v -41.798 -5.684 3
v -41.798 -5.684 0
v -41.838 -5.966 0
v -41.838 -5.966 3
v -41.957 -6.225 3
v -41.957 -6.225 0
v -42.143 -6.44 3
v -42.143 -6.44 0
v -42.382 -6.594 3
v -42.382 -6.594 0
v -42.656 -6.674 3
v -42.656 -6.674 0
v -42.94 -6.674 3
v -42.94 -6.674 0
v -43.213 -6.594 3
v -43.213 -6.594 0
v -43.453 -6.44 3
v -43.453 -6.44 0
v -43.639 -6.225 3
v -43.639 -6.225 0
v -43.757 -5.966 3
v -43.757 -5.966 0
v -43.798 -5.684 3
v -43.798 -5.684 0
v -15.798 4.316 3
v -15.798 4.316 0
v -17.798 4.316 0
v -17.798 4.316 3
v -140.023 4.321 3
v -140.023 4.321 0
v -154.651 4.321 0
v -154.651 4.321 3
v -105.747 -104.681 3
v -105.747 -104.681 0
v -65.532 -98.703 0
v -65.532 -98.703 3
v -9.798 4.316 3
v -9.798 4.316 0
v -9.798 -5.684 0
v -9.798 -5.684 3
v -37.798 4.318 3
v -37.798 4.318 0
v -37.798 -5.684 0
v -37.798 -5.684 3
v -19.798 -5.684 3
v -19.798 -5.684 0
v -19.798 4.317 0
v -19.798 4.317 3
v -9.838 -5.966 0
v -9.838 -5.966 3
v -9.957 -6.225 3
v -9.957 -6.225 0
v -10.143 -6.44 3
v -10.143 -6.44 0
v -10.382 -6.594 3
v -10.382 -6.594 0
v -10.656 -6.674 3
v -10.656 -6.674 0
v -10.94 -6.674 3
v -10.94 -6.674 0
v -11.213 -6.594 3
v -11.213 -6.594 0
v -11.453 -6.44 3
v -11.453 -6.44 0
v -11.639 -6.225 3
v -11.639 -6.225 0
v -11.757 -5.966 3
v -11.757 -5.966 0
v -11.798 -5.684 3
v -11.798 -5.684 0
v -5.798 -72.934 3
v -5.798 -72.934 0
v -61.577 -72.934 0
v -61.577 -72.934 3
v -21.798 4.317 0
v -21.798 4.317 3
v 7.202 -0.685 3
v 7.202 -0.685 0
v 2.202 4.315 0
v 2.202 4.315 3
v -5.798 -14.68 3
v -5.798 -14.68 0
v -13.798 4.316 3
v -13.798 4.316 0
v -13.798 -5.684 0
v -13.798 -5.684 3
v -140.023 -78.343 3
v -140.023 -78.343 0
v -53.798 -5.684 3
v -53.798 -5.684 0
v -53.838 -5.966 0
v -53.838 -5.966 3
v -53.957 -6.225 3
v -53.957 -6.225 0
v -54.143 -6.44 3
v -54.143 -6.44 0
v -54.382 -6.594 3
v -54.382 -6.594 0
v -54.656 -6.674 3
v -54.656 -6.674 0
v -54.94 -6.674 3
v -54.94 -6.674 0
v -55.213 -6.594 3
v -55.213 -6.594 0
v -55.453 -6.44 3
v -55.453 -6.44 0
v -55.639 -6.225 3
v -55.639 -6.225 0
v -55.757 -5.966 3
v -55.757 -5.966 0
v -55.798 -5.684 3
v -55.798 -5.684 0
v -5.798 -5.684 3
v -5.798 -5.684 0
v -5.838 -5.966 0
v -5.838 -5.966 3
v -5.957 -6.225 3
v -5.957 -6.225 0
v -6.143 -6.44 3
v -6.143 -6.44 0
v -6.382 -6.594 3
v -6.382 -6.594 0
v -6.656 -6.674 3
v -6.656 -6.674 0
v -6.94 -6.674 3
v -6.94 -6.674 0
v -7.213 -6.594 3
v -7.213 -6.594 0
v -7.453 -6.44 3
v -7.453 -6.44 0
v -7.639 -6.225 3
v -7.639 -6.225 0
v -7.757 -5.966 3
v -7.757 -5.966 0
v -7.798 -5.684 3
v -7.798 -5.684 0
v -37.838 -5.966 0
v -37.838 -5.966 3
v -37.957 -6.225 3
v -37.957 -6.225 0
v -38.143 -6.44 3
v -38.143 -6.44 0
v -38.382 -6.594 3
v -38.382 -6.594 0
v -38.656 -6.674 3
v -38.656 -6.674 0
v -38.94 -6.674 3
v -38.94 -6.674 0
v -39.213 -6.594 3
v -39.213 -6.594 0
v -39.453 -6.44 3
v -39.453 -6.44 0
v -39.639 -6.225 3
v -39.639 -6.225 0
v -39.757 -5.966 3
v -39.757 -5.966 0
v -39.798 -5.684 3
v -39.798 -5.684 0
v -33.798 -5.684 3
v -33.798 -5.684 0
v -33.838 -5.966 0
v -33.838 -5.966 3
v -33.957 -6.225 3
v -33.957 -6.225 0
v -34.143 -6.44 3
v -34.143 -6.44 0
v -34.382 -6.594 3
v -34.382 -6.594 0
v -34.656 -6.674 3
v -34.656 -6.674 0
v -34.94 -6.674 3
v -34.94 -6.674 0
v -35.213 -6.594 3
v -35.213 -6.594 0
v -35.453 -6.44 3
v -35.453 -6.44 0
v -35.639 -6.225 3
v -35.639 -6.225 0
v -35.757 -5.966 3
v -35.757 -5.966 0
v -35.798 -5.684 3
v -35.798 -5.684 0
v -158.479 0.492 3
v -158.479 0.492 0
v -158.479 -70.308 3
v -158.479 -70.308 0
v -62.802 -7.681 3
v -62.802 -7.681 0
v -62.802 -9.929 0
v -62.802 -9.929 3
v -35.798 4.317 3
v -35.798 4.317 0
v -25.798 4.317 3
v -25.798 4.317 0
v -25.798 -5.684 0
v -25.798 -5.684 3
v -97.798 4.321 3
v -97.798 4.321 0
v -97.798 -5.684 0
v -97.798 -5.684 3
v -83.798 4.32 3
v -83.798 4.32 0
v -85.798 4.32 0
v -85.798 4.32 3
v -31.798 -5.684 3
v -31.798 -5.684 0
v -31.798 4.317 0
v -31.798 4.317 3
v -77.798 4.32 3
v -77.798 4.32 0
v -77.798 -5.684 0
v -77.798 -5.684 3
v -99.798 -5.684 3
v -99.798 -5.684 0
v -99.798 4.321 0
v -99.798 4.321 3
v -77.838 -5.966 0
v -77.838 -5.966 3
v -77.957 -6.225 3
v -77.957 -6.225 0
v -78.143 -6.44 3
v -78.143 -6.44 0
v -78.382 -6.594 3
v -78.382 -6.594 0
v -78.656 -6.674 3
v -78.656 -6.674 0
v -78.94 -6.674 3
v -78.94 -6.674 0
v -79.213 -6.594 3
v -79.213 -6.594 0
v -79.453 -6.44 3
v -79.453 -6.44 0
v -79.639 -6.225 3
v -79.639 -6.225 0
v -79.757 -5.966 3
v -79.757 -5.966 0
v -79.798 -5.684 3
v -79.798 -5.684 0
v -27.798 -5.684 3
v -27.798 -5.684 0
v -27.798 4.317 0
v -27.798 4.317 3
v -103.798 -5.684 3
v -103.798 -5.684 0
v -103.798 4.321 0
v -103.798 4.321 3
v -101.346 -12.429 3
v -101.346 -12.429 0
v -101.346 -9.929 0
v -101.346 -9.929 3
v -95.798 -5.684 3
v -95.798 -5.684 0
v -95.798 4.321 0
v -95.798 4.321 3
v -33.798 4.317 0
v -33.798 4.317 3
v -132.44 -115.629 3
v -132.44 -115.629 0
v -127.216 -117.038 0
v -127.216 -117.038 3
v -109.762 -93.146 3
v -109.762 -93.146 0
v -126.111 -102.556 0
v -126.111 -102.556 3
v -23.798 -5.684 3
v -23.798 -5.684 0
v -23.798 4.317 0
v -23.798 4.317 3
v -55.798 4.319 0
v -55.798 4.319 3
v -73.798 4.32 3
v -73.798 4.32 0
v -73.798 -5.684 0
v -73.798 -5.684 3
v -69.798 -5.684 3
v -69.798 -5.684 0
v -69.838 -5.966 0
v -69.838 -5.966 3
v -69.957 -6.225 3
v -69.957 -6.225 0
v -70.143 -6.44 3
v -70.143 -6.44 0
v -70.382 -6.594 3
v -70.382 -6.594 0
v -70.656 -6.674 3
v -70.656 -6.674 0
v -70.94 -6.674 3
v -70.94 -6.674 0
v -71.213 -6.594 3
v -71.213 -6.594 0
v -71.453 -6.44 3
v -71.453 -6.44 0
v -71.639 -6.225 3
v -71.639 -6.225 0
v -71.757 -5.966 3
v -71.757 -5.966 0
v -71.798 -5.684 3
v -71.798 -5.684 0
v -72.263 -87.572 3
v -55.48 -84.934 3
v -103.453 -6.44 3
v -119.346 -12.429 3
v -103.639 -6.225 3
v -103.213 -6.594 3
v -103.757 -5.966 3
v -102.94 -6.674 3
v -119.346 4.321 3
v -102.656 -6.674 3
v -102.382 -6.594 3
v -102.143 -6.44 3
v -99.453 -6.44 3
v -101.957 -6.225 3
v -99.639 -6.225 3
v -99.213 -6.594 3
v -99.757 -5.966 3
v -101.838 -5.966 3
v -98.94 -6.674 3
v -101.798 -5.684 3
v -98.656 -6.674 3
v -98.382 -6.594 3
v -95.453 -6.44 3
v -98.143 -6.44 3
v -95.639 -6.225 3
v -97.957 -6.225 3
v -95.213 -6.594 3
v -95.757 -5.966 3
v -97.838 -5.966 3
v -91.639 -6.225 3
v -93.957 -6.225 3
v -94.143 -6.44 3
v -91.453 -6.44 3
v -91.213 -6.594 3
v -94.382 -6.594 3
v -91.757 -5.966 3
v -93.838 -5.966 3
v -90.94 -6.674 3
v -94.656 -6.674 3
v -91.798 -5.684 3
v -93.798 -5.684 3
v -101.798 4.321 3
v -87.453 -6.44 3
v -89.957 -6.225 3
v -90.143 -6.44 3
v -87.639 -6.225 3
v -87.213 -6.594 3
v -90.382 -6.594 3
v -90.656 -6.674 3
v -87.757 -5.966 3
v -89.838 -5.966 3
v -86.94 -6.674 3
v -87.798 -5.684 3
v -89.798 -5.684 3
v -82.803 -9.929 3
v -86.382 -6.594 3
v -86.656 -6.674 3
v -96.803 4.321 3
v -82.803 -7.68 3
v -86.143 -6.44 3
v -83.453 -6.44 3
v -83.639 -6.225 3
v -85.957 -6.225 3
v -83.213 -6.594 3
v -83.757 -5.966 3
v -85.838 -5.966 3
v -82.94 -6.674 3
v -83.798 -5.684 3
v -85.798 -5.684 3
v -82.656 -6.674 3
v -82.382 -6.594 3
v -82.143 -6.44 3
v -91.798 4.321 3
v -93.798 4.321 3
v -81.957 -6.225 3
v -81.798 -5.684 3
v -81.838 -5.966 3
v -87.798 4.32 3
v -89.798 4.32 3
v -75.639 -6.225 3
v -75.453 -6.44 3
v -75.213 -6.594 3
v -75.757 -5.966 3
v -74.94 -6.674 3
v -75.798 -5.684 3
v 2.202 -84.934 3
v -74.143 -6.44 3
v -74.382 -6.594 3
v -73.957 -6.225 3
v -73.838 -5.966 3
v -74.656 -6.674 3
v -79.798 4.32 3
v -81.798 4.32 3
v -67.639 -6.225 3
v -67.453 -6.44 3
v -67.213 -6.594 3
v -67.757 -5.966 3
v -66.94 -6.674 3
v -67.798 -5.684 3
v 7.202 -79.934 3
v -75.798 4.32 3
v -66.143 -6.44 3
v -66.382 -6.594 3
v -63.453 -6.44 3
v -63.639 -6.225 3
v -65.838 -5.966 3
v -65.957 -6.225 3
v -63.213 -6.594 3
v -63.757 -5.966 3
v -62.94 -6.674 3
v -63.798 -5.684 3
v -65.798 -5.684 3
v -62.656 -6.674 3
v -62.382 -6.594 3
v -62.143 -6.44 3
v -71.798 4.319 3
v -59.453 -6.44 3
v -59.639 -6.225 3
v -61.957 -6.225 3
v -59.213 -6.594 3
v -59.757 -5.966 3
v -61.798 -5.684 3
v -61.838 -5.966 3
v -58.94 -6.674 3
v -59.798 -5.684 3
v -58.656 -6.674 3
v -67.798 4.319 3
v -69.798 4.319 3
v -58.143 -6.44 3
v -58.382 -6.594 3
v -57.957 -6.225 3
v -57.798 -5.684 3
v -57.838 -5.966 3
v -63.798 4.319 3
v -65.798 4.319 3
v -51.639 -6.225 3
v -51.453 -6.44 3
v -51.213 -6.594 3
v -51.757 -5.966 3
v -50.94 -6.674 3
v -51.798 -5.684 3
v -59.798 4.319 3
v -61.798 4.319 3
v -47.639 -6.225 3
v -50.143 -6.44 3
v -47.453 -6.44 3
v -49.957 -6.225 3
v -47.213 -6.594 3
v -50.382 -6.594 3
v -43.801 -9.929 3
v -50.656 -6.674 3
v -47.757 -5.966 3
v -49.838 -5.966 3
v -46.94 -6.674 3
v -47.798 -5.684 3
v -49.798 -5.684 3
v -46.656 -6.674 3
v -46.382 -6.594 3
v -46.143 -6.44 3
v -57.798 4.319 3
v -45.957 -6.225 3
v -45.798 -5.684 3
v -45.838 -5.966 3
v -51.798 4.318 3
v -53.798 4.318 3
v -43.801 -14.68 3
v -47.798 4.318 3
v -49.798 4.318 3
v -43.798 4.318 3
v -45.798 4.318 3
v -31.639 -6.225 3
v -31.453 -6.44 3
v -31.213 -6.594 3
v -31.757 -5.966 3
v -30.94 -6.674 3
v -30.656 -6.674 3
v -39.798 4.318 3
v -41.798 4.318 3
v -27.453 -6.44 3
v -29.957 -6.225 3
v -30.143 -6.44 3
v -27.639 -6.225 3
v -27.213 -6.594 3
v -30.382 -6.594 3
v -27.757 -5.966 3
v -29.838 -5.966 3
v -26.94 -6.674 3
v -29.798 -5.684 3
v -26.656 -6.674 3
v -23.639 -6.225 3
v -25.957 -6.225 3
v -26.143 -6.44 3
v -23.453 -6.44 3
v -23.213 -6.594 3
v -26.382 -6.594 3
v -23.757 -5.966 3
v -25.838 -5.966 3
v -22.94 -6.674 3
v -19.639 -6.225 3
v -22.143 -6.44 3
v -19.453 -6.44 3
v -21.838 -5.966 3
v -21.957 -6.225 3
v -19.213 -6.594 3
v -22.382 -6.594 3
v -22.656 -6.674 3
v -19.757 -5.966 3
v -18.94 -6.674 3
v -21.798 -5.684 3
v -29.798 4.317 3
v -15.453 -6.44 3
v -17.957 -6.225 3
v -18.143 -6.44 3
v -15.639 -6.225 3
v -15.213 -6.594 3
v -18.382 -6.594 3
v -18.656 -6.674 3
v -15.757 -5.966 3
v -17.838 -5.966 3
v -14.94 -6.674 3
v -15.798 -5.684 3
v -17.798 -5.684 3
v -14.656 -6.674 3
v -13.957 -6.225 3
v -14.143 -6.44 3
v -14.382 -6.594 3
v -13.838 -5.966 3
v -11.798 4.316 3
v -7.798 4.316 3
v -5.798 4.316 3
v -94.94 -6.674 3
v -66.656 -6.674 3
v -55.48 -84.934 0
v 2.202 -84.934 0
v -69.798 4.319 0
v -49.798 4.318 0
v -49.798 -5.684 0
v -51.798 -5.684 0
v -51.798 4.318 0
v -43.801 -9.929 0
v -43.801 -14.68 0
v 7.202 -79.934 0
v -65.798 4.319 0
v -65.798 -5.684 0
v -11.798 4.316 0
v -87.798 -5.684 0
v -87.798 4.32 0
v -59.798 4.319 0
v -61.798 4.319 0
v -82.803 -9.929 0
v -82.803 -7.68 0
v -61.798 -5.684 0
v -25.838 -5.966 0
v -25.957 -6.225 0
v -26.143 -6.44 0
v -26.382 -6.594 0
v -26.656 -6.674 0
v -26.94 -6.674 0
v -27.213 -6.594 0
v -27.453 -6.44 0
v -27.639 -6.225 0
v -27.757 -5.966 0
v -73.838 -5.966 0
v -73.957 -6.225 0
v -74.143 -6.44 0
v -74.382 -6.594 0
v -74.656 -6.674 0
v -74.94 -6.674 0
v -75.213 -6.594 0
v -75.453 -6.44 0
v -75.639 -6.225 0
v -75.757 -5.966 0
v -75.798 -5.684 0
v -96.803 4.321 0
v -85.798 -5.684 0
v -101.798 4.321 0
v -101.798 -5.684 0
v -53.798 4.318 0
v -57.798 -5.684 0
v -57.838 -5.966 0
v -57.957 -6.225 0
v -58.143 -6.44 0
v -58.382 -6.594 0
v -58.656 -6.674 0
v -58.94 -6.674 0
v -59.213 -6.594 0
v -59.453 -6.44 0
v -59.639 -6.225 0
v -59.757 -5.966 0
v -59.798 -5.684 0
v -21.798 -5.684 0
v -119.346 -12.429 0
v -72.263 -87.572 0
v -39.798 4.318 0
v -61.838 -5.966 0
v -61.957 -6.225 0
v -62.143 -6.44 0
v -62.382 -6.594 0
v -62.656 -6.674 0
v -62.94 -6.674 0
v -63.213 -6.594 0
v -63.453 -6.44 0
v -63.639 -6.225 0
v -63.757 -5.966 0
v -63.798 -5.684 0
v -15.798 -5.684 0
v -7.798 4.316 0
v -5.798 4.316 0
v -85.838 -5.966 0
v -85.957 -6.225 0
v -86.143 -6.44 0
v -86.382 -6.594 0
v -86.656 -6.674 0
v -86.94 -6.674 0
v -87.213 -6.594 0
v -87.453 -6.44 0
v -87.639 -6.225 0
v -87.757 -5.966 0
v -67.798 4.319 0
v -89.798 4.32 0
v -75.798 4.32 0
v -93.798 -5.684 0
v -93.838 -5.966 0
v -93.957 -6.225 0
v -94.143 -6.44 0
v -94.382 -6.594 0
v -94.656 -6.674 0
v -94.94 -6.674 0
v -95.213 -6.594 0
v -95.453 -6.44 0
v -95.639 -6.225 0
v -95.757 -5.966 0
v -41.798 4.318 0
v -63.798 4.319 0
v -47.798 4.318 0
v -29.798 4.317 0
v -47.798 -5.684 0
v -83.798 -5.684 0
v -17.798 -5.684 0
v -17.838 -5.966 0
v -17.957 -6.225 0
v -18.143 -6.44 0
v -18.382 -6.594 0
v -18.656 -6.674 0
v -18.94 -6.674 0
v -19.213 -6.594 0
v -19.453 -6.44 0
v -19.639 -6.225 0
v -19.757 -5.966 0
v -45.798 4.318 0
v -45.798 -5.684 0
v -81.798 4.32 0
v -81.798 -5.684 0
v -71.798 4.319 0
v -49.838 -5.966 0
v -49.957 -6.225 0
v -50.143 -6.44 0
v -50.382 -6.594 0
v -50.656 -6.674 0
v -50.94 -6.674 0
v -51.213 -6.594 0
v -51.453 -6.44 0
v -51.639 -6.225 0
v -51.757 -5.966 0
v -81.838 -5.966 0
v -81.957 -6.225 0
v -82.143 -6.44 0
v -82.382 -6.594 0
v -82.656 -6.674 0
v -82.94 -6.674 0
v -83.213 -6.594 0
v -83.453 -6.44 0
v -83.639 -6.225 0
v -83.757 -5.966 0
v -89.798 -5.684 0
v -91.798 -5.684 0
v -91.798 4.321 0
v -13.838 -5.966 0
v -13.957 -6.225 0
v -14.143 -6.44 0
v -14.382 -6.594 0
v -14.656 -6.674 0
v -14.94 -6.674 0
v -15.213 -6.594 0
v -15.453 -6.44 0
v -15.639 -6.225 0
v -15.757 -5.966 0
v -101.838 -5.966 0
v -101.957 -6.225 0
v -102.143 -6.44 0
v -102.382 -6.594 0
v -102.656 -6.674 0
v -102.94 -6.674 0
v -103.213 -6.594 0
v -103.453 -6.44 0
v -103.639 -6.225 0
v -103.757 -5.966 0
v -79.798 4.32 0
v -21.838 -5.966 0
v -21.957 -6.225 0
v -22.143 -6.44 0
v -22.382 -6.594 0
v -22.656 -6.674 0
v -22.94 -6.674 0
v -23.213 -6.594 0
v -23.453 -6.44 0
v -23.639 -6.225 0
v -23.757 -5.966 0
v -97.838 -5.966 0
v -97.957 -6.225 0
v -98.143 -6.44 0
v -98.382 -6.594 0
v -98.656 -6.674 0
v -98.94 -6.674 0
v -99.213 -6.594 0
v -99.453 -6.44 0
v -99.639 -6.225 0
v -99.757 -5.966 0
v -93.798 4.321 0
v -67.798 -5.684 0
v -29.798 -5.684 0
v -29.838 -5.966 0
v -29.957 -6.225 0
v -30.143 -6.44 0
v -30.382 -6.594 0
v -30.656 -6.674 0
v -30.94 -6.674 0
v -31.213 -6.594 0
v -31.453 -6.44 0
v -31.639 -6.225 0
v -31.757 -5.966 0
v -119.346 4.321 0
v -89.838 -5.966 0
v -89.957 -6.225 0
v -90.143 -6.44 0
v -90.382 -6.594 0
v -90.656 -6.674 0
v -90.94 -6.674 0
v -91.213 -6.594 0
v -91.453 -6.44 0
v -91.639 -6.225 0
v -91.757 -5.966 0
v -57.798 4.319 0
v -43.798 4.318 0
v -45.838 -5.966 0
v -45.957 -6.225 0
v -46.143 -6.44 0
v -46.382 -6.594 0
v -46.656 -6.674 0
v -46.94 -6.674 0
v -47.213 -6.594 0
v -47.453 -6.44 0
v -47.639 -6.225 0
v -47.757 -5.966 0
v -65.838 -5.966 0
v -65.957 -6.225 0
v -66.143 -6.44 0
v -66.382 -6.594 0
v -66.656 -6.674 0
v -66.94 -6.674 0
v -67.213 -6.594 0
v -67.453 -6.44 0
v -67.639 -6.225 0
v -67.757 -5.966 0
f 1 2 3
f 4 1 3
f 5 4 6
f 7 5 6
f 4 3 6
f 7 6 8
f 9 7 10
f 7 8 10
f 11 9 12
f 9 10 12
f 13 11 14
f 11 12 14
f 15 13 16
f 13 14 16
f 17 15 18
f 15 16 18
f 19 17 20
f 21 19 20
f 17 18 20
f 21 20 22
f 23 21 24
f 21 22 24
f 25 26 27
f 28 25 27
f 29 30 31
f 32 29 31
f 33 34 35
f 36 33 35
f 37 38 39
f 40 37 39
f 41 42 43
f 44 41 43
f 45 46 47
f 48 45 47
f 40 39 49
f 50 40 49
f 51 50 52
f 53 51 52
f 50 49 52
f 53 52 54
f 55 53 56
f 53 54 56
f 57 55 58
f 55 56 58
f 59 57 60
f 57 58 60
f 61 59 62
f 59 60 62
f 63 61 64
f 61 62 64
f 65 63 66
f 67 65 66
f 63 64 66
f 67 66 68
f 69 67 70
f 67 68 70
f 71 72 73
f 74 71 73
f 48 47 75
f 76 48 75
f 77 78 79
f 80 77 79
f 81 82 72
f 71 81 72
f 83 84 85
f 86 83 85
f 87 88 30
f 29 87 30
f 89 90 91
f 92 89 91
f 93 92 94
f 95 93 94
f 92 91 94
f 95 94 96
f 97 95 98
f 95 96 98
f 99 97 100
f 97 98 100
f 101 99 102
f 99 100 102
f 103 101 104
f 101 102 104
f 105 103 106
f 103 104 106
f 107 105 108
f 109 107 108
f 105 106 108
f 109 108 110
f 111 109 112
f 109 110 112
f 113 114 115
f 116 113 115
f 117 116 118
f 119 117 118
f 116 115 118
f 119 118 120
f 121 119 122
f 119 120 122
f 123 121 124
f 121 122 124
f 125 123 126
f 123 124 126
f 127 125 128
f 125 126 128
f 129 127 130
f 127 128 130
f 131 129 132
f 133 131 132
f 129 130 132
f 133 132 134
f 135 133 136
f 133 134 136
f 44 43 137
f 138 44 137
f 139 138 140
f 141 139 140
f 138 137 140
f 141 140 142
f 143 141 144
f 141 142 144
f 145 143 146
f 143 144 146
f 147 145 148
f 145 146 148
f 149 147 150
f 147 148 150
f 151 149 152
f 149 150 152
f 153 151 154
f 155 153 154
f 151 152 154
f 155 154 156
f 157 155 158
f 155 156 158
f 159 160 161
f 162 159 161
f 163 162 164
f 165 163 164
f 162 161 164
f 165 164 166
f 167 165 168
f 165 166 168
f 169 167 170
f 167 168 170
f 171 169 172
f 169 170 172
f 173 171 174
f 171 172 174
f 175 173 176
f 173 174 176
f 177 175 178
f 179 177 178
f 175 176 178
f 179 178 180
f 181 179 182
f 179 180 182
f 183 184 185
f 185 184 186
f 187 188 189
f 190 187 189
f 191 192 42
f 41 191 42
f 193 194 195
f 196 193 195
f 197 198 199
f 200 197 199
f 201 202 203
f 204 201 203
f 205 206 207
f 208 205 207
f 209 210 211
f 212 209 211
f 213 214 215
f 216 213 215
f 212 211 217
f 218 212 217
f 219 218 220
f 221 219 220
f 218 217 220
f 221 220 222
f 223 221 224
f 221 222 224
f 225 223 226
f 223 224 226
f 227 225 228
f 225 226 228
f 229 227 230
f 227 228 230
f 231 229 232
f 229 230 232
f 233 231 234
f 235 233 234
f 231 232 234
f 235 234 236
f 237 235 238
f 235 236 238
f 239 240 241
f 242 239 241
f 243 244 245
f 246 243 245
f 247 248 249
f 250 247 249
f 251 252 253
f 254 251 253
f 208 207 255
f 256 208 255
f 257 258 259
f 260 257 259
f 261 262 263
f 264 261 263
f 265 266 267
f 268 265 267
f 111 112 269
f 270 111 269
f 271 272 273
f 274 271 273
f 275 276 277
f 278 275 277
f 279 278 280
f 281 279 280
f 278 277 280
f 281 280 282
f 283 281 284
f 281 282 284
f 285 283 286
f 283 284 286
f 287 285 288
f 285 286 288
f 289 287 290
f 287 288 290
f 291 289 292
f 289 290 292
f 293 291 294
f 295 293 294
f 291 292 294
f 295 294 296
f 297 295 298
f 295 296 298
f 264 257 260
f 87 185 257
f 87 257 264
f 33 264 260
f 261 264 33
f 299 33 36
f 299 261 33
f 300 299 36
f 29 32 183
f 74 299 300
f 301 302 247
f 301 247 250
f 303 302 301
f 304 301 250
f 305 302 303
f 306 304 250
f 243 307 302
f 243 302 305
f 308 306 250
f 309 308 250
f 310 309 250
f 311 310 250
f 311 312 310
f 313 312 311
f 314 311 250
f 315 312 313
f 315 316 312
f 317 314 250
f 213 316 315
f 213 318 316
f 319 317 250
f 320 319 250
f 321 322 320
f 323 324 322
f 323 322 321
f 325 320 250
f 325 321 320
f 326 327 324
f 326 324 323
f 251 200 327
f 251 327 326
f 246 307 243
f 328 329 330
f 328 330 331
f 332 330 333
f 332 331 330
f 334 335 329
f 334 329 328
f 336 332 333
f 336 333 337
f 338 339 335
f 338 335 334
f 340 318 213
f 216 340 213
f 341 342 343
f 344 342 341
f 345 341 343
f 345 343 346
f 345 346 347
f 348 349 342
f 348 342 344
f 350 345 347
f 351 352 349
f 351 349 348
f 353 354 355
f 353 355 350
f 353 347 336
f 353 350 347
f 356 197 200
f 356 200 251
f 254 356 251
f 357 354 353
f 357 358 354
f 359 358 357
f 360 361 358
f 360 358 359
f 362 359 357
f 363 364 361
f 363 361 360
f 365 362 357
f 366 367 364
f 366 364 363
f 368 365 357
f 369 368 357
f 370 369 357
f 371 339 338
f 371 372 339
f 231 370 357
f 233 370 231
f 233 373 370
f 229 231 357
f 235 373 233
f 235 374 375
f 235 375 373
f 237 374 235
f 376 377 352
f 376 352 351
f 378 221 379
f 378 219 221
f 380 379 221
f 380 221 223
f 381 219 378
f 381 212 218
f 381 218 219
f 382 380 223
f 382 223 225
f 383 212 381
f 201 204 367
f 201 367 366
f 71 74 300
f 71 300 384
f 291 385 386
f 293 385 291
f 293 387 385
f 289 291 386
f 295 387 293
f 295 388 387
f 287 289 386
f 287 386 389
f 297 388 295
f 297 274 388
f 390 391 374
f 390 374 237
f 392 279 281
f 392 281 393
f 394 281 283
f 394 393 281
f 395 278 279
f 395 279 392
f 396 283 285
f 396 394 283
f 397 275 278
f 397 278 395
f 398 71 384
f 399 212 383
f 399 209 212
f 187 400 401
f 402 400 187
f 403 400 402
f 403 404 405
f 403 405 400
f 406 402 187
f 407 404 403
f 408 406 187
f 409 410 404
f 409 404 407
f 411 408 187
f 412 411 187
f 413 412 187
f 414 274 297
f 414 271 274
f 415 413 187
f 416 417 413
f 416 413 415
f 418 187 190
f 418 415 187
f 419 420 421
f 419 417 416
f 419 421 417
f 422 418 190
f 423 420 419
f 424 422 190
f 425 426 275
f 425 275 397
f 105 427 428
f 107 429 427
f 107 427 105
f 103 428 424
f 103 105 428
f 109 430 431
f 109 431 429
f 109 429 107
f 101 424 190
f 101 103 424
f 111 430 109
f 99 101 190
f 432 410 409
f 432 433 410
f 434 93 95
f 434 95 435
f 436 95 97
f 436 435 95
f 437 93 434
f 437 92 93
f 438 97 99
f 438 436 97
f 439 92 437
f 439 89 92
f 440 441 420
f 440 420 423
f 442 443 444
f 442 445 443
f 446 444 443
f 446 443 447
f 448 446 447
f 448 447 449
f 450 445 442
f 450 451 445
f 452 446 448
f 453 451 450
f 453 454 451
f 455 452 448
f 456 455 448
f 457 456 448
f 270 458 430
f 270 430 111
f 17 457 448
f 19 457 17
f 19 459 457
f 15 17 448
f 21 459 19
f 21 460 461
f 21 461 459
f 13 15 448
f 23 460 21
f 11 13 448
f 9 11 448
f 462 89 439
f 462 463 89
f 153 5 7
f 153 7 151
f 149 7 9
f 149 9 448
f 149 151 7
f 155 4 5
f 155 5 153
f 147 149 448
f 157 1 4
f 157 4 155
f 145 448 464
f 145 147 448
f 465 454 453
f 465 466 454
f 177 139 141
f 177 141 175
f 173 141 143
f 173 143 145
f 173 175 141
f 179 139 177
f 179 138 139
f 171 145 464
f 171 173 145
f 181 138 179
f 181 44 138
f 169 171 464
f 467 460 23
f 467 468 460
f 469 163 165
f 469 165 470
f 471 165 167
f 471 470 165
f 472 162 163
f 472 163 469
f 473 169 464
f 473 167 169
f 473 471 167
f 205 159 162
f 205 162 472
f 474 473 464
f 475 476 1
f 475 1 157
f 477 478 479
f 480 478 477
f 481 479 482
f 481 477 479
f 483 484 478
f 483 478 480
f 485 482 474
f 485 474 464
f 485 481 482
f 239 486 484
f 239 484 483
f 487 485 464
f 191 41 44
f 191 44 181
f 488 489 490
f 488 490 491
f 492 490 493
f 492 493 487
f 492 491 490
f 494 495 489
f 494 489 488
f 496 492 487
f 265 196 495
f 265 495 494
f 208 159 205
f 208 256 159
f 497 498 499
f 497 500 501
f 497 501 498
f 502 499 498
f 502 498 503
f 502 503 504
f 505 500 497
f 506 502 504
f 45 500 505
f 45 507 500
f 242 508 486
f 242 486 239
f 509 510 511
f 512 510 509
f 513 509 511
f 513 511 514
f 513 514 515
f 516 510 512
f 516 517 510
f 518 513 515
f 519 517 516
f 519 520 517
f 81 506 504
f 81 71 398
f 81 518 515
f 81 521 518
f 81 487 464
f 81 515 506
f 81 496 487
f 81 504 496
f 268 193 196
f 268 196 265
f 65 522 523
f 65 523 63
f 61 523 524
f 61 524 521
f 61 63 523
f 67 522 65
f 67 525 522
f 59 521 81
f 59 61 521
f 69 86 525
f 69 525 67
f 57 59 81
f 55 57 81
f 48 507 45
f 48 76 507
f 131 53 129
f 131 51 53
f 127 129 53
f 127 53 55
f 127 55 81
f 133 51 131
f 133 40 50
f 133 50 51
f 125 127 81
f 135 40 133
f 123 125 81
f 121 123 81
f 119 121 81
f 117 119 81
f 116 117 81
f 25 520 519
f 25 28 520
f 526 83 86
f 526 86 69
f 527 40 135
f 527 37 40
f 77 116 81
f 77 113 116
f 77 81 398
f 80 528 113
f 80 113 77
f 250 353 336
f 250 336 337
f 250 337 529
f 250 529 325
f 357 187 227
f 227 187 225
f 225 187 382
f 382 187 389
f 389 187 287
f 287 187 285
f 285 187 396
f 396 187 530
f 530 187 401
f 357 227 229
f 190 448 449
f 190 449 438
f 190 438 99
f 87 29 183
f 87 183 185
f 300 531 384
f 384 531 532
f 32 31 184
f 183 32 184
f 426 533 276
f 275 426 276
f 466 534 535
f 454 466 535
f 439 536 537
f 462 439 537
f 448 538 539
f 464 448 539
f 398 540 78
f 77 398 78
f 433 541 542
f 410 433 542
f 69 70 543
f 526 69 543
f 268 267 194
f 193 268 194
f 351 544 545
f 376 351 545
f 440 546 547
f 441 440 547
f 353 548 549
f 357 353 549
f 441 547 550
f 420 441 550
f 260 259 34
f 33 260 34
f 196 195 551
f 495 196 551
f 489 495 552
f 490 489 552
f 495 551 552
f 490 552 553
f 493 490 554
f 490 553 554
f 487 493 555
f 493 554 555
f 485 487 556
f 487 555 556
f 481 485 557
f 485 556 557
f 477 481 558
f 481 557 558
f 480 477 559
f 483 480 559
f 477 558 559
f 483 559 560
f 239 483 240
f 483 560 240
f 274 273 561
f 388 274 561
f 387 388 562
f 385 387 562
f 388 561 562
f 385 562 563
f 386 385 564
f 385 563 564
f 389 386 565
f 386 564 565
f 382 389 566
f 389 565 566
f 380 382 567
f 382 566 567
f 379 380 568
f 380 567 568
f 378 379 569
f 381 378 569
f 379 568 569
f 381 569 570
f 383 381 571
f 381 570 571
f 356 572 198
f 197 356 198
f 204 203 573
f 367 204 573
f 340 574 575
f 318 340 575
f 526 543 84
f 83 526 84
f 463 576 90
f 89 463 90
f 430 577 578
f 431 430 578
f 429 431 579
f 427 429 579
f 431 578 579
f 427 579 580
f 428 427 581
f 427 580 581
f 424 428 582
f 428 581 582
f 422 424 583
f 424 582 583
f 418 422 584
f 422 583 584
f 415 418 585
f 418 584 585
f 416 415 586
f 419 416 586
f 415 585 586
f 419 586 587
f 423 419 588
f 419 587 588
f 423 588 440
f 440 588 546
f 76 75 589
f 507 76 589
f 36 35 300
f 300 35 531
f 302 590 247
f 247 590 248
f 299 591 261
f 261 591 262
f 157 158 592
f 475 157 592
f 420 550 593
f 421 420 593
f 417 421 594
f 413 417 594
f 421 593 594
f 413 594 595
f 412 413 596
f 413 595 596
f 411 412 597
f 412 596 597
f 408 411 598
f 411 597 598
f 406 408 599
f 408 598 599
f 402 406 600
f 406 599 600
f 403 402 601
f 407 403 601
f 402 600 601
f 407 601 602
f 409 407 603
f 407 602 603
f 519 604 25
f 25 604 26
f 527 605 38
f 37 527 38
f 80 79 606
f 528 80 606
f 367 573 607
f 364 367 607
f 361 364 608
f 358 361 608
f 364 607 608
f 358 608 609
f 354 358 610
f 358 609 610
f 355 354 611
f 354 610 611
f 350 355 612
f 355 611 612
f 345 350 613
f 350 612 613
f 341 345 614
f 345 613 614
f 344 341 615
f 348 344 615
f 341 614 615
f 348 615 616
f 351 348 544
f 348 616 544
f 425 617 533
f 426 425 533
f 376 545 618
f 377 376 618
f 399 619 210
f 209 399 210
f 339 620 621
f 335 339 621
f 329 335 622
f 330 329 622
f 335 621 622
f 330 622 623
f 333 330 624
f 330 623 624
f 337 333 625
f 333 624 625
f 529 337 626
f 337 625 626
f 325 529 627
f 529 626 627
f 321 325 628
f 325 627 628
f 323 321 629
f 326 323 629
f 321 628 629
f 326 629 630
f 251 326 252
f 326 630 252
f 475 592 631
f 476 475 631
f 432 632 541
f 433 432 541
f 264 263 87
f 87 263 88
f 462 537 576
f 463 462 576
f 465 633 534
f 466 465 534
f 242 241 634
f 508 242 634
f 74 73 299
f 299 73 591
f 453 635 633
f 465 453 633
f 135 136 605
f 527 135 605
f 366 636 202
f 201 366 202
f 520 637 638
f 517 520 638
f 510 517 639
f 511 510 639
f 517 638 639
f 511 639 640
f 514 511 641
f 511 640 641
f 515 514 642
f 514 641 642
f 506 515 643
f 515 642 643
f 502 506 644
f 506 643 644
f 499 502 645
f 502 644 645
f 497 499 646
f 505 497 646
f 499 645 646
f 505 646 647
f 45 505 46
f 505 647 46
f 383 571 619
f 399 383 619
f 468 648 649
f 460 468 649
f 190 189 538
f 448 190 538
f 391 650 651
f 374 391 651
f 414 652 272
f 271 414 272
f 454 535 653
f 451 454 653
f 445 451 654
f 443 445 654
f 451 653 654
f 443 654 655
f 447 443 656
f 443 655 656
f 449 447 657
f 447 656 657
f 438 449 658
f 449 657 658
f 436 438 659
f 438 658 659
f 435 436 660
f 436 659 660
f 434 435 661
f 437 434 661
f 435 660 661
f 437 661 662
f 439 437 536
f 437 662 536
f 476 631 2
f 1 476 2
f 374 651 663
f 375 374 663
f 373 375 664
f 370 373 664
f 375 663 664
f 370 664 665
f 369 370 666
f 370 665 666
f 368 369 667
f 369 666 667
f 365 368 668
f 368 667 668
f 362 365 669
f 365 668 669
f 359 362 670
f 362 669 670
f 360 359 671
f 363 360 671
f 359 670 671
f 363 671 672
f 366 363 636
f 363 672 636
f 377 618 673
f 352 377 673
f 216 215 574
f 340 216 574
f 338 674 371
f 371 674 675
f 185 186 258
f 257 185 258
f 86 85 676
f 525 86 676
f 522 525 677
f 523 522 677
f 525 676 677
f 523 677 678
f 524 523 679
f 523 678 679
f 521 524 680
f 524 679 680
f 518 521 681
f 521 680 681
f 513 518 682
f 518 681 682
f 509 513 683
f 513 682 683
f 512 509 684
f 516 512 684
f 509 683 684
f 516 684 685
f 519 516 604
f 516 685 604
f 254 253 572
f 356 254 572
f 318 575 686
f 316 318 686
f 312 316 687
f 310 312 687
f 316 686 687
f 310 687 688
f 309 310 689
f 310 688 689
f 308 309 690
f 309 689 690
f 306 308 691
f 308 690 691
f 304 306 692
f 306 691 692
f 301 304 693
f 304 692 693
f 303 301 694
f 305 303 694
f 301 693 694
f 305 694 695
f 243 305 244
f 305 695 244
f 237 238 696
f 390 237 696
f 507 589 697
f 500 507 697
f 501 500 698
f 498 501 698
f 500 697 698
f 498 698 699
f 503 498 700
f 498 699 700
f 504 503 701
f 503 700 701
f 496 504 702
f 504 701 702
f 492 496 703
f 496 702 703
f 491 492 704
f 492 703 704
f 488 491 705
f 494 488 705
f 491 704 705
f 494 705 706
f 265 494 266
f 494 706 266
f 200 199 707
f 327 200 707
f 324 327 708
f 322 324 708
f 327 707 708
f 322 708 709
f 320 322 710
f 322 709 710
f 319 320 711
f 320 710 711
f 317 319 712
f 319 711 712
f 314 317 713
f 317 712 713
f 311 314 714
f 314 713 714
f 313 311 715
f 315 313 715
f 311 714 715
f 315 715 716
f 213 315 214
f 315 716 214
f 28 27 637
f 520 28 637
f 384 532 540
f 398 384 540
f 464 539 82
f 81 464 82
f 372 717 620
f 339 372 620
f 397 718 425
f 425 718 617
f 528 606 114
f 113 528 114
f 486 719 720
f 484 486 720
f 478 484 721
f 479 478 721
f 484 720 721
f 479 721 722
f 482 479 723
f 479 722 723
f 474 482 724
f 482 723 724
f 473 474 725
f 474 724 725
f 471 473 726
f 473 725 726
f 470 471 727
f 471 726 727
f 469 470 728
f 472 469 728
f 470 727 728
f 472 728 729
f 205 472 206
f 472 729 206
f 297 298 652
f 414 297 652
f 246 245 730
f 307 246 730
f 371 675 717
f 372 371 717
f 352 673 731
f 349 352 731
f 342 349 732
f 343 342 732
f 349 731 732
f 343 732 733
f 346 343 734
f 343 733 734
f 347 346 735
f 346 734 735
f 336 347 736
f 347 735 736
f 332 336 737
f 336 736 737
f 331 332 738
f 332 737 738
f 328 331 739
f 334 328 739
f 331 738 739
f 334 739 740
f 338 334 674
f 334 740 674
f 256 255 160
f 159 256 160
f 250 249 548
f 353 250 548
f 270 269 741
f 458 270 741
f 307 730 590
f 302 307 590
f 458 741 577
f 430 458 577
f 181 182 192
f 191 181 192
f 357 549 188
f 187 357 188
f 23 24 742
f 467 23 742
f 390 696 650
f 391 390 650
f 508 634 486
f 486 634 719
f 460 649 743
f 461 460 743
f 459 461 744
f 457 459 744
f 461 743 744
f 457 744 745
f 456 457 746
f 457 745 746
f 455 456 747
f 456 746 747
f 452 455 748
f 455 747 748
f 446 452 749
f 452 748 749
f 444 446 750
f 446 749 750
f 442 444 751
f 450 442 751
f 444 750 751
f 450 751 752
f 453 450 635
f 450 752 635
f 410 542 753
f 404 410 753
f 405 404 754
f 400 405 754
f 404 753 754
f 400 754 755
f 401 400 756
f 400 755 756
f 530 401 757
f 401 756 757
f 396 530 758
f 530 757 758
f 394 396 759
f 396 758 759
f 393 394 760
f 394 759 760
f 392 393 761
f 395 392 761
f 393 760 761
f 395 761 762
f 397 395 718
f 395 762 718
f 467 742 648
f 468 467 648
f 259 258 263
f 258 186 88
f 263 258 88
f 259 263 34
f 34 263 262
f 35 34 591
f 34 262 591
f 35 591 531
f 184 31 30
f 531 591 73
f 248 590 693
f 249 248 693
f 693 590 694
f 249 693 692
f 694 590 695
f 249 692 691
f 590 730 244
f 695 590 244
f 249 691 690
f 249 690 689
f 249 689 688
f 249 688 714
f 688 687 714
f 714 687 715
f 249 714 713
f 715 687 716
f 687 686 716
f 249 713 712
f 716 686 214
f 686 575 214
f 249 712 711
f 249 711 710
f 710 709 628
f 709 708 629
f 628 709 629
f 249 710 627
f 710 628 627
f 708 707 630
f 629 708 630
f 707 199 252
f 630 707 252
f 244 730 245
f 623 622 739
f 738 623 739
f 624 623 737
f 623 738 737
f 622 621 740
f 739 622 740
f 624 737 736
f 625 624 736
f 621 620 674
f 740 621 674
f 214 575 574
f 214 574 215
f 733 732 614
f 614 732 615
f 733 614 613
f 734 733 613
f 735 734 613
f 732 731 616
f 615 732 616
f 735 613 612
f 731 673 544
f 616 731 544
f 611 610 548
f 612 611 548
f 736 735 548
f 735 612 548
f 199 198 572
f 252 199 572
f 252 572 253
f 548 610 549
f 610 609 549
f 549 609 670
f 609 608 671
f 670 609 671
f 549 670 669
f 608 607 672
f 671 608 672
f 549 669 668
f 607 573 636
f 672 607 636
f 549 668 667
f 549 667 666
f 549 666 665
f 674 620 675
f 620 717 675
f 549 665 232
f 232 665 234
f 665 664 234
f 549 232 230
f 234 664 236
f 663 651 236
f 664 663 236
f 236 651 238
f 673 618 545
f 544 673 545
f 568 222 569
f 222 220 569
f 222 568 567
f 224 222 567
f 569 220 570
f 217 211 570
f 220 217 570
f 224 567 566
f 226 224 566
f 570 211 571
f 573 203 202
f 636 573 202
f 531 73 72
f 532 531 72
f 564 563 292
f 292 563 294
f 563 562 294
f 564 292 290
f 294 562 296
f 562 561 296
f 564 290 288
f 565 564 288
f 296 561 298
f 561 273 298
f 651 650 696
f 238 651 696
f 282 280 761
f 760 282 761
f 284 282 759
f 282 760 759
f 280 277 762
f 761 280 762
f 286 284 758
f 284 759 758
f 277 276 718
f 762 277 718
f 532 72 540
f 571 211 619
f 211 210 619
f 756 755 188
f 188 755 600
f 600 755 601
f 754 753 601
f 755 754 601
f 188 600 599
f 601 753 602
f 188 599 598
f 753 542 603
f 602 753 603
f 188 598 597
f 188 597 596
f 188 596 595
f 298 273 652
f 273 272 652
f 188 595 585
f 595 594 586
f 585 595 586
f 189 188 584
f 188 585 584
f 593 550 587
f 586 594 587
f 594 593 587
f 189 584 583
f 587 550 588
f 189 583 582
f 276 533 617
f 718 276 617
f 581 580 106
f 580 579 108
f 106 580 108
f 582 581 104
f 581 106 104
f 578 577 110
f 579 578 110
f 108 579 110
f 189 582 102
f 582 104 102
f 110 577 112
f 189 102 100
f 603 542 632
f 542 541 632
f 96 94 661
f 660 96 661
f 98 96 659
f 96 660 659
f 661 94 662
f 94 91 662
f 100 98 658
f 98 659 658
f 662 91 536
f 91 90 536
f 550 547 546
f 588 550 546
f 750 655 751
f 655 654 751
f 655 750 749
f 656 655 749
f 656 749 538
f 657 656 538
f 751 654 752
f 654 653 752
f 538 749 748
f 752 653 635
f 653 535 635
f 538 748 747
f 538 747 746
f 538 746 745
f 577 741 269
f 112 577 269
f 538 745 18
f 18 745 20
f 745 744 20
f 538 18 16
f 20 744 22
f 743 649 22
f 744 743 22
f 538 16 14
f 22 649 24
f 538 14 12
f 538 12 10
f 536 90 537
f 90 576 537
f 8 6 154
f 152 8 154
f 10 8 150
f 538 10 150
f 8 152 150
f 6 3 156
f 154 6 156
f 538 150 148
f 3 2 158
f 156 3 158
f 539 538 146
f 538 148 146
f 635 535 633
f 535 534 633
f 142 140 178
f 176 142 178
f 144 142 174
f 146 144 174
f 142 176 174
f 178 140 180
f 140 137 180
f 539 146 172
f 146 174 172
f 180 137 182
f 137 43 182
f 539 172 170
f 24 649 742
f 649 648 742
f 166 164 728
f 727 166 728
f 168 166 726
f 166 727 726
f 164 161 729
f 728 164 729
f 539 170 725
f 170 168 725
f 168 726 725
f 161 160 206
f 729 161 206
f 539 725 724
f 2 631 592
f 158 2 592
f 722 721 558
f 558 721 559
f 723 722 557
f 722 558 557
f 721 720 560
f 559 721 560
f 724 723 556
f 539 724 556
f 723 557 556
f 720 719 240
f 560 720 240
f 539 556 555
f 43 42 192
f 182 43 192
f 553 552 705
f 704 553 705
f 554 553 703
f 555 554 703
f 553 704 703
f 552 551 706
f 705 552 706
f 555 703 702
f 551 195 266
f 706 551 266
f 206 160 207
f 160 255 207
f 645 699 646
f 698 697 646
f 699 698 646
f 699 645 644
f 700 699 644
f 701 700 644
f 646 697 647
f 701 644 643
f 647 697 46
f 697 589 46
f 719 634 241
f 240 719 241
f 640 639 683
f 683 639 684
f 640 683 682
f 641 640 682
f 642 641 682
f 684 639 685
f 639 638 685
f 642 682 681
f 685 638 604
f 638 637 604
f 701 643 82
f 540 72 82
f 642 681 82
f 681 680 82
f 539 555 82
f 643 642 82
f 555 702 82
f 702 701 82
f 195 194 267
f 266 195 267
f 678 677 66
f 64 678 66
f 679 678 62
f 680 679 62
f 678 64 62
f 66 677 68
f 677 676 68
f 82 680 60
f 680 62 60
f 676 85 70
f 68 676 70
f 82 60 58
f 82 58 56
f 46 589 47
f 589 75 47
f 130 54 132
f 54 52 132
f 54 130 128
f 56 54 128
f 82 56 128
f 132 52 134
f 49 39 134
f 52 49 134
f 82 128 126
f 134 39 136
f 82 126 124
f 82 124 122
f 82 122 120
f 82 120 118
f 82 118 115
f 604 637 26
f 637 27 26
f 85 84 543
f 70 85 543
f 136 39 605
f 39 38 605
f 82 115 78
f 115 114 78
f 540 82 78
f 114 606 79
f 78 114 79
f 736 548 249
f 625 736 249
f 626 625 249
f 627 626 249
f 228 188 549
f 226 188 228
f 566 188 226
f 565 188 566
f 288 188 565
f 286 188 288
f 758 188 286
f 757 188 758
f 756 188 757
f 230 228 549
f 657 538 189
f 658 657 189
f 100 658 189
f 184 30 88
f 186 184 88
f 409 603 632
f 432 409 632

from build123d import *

# Parameters (mm, degrees)
BOSS_EXTRU_1_DEPTH = 3


with BuildPart() as part:
    # Esquisse1 → Boss.-Extru.1 (new body)
    with BuildSketch(Plane.XY):
        with BuildLine():
            Line((-119.34630187, 4.320852512), (-119.346382005, -12.429484403))
            Line((-119.346382005, -12.429484403), (-101.345774335, -12.429484403))
            Line((-101.345774335, -12.429484403), (-101.345774335, -9.929307079))
            Line((-101.345774335, -9.929307079), (-82.803225752, -9.929307079))
            Line((-82.803225752, -9.929307079), (-82.803225752, -7.679926158))
            Line((-82.803225752, -7.679926158), (-62.801949021, -7.681038584))
            Line((-62.801949021, -7.681038584), (-62.801949021, -9.929307079))
            Line((-62.801949021, -9.929307079), (-43.80060136, -9.929307079))
            Line((-43.80060136, -9.929307079), (-43.80060136, -14.679643994))
            Line((-43.80060136, -14.679643994), (-5.797906039, -14.679643994))
            Line((-5.797906039, -14.679643994), (-5.797906039, -72.933633781))
            Line((-5.797906039, -72.933633781), (-61.577157206, -72.933633781))
            Line((-61.577157206, -72.933633781), (-72.263087593, -87.572177036))
            Line((-72.263087593, -87.572177036), (-109.761976756, -93.1463556))
            Line((-109.761976756, -93.1463556), (-126.111124489, -102.556497988))
            Line((-126.111124489, -102.556497988), (-140.02282508, -78.342807898))
            Line((-140.02282508, -78.342807898), (-140.02282508, 4.320852512))
            Line((-140.02282508, 4.320852512), (-142.02282508, 4.320852512))
            Line((-142.02282508, 4.320852512), (-154.65055875, 4.320852512))
            Line((-154.65055875, 4.320852512), (-158.478985875, 0.492425388))
            Line((-158.478985875, 0.492425388), (-158.478985875, -3.429484403))
            Line((-158.478985875, -3.429484403), (-158.478985875, -70.307502815))
            Line((-158.478985875, -70.307502815), (-132.440036759, -115.628996046))
            Line((-132.440036759, -115.628996046), (-127.216265437, -117.03834868))
            Line((-127.216265437, -117.03834868), (-105.747438988, -104.681452952))
            Line((-105.747438988, -104.681452952), (-65.531582138, -98.70339941))
            Line((-65.531582138, -98.70339941), (-55.479847181, -84.933633781))
            Line((-55.479847181, -84.933633781), (2.202093961, -84.933633781))
            Line((2.202093961, -84.933633781), (7.202093961, -79.933633781))
            Line((7.202093961, -79.933633781), (7.202093961, -0.684932032))
            Line((7.202093961, -0.684932032), (2.202093969, 4.315346056))
            Line((2.202093969, 4.315346056), (-5.797906039, 4.315790998))
            Line((-5.797906039, 4.315790998), (-5.797906039, -5.684153384))
            ThreePointArc((-5.797906039, -5.684153384), (-6.797906039, -6.684153384), (-7.797906039, -5.684153384))
            Line((-7.797906039, -5.684153384), (-7.797906039, 4.315902234))
            Line((-7.797906039, 4.315902234), (-9.797906039, 4.316013469))
            Line((-9.797906039, 4.316013469), (-9.797906039, -5.684153384))
            ThreePointArc((-9.797906039, -5.684153384), (-10.797906039, -6.684153384), (-11.797906039, -5.684153384))
            Line((-11.797906039, -5.684153384), (-11.797906039, 4.316124705))
            Line((-11.797906039, 4.316124705), (-13.797906039, 4.31623594))
            Line((-13.797906039, 4.31623594), (-13.797906039, -5.684153384))
            ThreePointArc((-13.797906039, -5.684153384), (-14.797906039, -6.684153384), (-15.797906039, -5.684153384))
            Line((-15.797906039, -5.684153384), (-15.797906039, 4.316347176))
            Line((-15.797906039, 4.316347176), (-17.797906039, 4.316458411))
            Line((-17.797906039, 4.316458411), (-17.797906039, -5.684153384))
            ThreePointArc((-17.797906039, -5.684153384), (-18.797906039, -6.684153384), (-19.797906039, -5.684153384))
            Line((-19.797906039, -5.684153384), (-19.797906039, 4.316569647))
            Line((-19.797906039, 4.316569647), (-21.797906039, 4.316680882))
            Line((-21.797906039, 4.316680882), (-21.797906039, -5.684153384))
            ThreePointArc((-21.797906039, -5.684153384), (-22.797906039, -6.684153384), (-23.797906039, -5.684153384))
            Line((-23.797906039, -5.684153384), (-23.797906039, 4.316792118))
            Line((-23.797906039, 4.316792118), (-25.797906039, 4.316903353))
            Line((-25.797906039, 4.316903353), (-25.797906039, -5.684153384))
            ThreePointArc((-25.797906039, -5.684153384), (-26.797906039, -6.684153384), (-27.797906039, -5.684153384))
            Line((-27.797906039, -5.684153384), (-27.797906039, 4.317014589))
            Line((-27.797906039, 4.317014589), (-29.797906039, 4.317125824))
            Line((-29.797906039, 4.317125824), (-29.797906039, -5.684153384))
            ThreePointArc((-29.797906039, -5.684153384), (-30.797906039, -6.684153384), (-31.797906039, -5.684153384))
            Line((-31.797906039, -5.684153384), (-31.797906039, 4.31723706))
            Line((-31.797906039, 4.31723706), (-33.797906039, 4.317348295))
            Line((-33.797906039, 4.317348295), (-33.797906039, -5.684153384))
            ThreePointArc((-33.797906039, -5.684153384), (-34.797906039, -6.684153384), (-35.797906039, -5.684153384))
            Line((-35.797906039, -5.684153384), (-35.797906039, 4.317459531))
            Line((-35.797906039, 4.317459531), (-37.797906039, 4.317570766))
            Line((-37.797906039, 4.317570766), (-37.797906039, -5.684153384))
            ThreePointArc((-37.797906039, -5.684153384), (-38.797906039, -6.684153384), (-39.797906039, -5.684153384))
            Line((-39.797906039, -5.684153384), (-39.797906039, 4.317682002))
            Line((-39.797906039, 4.317682002), (-41.797906039, 4.317793237))
            Line((-41.797906039, 4.317793237), (-41.797906039, -5.684153384))
            ThreePointArc((-41.797906039, -5.684153384), (-42.797906039, -6.684153384), (-43.797906039, -5.684153384))
            Line((-43.797906039, -5.684153384), (-43.797906039, 4.317904473))
            Line((-43.797906039, 4.317904473), (-45.797906039, 4.318015708))
            Line((-45.797906039, 4.318015708), (-45.797906039, -5.684153384))
            ThreePointArc((-45.797906039, -5.684153384), (-46.797906039, -6.684153384), (-47.797906039, -5.684153384))
            Line((-47.797906039, -5.684153384), (-47.797906039, 4.318126944))
            Line((-47.797906039, 4.318126944), (-49.797906039, 4.318238179))
            Line((-49.797906039, 4.318238179), (-49.797906039, -5.684153384))
            ThreePointArc((-49.797906039, -5.684153384), (-50.797906039, -6.684153384), (-51.797906039, -5.684153384))
            Line((-51.797906039, -5.684153384), (-51.797906039, 4.318349415))
            Line((-51.797906039, 4.318349415), (-53.797906039, 4.31846065))
            Line((-53.797906039, 4.31846065), (-53.797906039, -5.684153384))
            ThreePointArc((-53.797906039, -5.684153384), (-54.797906039, -6.684153384), (-55.797906039, -5.684153384))
            Line((-55.797906039, -5.684153384), (-55.797906039, 4.318571886))
            Line((-55.797906039, 4.318571886), (-57.797906039, 4.318683121))
            Line((-57.797906039, 4.318683121), (-57.797906039, -5.684153384))
            ThreePointArc((-57.797906039, -5.684153384), (-58.797906039, -6.684153384), (-59.797906039, -5.684153384))
            Line((-59.797906039, -5.684153384), (-59.797906039, 4.318794357))
            Line((-59.797906039, 4.318794357), (-61.797906039, 4.318905592))
            Line((-61.797906039, 4.318905592), (-61.797906039, -5.684153384))
            ThreePointArc((-61.797906039, -5.684153384), (-62.797906039, -6.684153384), (-63.797906039, -5.684153384))
            Line((-63.797906039, -5.684153384), (-63.797906039, 4.319016828))
            Line((-63.797906039, 4.319016828), (-65.797906039, 4.319128063))
            Line((-65.797906039, 4.319128063), (-65.797906039, -5.684153384))
            ThreePointArc((-65.797906039, -5.684153384), (-66.797906039, -6.684153384), (-67.797906039, -5.684153384))
            Line((-67.797906039, -5.684153384), (-67.797906039, 4.319239299))
            Line((-67.797906039, 4.319239299), (-69.797906039, 4.319350534))
            Line((-69.797906039, 4.319350534), (-69.797906039, -5.684153384))
            ThreePointArc((-69.797906039, -5.684153384), (-70.797906039, -6.684153384), (-71.797906039, -5.684153384))
            Line((-71.797906039, -5.684153384), (-71.797906039, 4.31946177))
            Line((-71.797906039, 4.31946177), (-73.797906039, 4.319573005))
            Line((-73.797906039, 4.319573005), (-73.797906039, -5.684153384))
            ThreePointArc((-73.797906039, -5.684153384), (-74.797906039, -6.684153384), (-75.797906039, -5.684153384))
            Line((-75.797906039, -5.684153384), (-75.797906039, 4.319684241))
            Line((-75.797906039, 4.319684241), (-77.797906039, 4.319795476))
            Line((-77.797906039, 4.319795476), (-77.797906039, -5.684153384))
            ThreePointArc((-77.797906039, -5.684153384), (-78.797906039, -6.684153384), (-79.797906039, -5.684153384))
            Line((-79.797906039, -5.684153384), (-79.797906039, 4.319906712))
            Line((-79.797906039, 4.319906712), (-81.797906039, 4.320017947))
            Line((-81.797906039, 4.320017947), (-81.797906039, -5.684153384))
            ThreePointArc((-81.797906039, -5.684153384), (-82.797906039, -6.684153384), (-83.797906039, -5.684153384))
            Line((-83.797906039, -5.684153384), (-83.797906039, 4.320129183))
            Line((-83.797906039, 4.320129183), (-85.797906039, 4.320240418))
            Line((-85.797906039, 4.320240418), (-85.797906039, -5.684153384))
            ThreePointArc((-85.797906039, -5.684153384), (-86.797906039, -6.684153384), (-87.797906039, -5.684153384))
            Line((-87.797906039, -5.684153384), (-87.797906039, 4.320351654))
            Line((-87.797906039, 4.320351654), (-89.797906039, 4.320462889))
            Line((-89.797906039, 4.320462889), (-89.797906039, -5.684153384))
            ThreePointArc((-89.797906039, -5.684153384), (-90.797906039, -6.684153384), (-91.797906039, -5.684153384))
            Line((-91.797906039, -5.684153384), (-91.797906039, 4.320574125))
            Line((-91.797906039, 4.320574125), (-93.797906039, 4.32068536))
            Line((-93.797906039, 4.32068536), (-93.797906039, -5.684153384))
            ThreePointArc((-93.797906039, -5.684153384), (-94.797906039, -6.684153384), (-95.797906039, -5.684153384))
            Line((-95.797906039, -5.684153384), (-95.797906039, 4.320796596))
            Line((-95.797906039, 4.320796596), (-96.80328137, 4.320852512))
            Line((-96.80328137, 4.320852512), (-97.797906039, 4.320852512))
            Line((-97.797906039, 4.320852512), (-97.797906039, -5.684153384))
            ThreePointArc((-97.797906039, -5.684153384), (-98.797906039, -6.684153384), (-99.797906039, -5.684153384))
            Line((-99.797906039, -5.684153384), (-99.797906039, 4.320852512))
            Line((-99.797906039, 4.320852512), (-101.797906039, 4.320852512))
            Line((-101.797906039, 4.320852512), (-101.797906039, -5.684153384))
            ThreePointArc((-101.797906039, -5.684153384), (-102.797906039, -6.684153384), (-103.797906039, -5.684153384))
            Line((-103.797906039, -5.684153384), (-103.797906039, 4.320852512))
            Line((-103.797906039, 4.320852512), (-103.799739609, 4.320852512))
            Line((-103.799739609, 4.320852512), (-117.346315028, 4.320852512))
            Line((-117.346315028, 4.320852512), (-119.34630187, 4.320852512))
        make_face()
    extrude(amount=BOSS_EXTRU_1_DEPTH)


solid = part.part
